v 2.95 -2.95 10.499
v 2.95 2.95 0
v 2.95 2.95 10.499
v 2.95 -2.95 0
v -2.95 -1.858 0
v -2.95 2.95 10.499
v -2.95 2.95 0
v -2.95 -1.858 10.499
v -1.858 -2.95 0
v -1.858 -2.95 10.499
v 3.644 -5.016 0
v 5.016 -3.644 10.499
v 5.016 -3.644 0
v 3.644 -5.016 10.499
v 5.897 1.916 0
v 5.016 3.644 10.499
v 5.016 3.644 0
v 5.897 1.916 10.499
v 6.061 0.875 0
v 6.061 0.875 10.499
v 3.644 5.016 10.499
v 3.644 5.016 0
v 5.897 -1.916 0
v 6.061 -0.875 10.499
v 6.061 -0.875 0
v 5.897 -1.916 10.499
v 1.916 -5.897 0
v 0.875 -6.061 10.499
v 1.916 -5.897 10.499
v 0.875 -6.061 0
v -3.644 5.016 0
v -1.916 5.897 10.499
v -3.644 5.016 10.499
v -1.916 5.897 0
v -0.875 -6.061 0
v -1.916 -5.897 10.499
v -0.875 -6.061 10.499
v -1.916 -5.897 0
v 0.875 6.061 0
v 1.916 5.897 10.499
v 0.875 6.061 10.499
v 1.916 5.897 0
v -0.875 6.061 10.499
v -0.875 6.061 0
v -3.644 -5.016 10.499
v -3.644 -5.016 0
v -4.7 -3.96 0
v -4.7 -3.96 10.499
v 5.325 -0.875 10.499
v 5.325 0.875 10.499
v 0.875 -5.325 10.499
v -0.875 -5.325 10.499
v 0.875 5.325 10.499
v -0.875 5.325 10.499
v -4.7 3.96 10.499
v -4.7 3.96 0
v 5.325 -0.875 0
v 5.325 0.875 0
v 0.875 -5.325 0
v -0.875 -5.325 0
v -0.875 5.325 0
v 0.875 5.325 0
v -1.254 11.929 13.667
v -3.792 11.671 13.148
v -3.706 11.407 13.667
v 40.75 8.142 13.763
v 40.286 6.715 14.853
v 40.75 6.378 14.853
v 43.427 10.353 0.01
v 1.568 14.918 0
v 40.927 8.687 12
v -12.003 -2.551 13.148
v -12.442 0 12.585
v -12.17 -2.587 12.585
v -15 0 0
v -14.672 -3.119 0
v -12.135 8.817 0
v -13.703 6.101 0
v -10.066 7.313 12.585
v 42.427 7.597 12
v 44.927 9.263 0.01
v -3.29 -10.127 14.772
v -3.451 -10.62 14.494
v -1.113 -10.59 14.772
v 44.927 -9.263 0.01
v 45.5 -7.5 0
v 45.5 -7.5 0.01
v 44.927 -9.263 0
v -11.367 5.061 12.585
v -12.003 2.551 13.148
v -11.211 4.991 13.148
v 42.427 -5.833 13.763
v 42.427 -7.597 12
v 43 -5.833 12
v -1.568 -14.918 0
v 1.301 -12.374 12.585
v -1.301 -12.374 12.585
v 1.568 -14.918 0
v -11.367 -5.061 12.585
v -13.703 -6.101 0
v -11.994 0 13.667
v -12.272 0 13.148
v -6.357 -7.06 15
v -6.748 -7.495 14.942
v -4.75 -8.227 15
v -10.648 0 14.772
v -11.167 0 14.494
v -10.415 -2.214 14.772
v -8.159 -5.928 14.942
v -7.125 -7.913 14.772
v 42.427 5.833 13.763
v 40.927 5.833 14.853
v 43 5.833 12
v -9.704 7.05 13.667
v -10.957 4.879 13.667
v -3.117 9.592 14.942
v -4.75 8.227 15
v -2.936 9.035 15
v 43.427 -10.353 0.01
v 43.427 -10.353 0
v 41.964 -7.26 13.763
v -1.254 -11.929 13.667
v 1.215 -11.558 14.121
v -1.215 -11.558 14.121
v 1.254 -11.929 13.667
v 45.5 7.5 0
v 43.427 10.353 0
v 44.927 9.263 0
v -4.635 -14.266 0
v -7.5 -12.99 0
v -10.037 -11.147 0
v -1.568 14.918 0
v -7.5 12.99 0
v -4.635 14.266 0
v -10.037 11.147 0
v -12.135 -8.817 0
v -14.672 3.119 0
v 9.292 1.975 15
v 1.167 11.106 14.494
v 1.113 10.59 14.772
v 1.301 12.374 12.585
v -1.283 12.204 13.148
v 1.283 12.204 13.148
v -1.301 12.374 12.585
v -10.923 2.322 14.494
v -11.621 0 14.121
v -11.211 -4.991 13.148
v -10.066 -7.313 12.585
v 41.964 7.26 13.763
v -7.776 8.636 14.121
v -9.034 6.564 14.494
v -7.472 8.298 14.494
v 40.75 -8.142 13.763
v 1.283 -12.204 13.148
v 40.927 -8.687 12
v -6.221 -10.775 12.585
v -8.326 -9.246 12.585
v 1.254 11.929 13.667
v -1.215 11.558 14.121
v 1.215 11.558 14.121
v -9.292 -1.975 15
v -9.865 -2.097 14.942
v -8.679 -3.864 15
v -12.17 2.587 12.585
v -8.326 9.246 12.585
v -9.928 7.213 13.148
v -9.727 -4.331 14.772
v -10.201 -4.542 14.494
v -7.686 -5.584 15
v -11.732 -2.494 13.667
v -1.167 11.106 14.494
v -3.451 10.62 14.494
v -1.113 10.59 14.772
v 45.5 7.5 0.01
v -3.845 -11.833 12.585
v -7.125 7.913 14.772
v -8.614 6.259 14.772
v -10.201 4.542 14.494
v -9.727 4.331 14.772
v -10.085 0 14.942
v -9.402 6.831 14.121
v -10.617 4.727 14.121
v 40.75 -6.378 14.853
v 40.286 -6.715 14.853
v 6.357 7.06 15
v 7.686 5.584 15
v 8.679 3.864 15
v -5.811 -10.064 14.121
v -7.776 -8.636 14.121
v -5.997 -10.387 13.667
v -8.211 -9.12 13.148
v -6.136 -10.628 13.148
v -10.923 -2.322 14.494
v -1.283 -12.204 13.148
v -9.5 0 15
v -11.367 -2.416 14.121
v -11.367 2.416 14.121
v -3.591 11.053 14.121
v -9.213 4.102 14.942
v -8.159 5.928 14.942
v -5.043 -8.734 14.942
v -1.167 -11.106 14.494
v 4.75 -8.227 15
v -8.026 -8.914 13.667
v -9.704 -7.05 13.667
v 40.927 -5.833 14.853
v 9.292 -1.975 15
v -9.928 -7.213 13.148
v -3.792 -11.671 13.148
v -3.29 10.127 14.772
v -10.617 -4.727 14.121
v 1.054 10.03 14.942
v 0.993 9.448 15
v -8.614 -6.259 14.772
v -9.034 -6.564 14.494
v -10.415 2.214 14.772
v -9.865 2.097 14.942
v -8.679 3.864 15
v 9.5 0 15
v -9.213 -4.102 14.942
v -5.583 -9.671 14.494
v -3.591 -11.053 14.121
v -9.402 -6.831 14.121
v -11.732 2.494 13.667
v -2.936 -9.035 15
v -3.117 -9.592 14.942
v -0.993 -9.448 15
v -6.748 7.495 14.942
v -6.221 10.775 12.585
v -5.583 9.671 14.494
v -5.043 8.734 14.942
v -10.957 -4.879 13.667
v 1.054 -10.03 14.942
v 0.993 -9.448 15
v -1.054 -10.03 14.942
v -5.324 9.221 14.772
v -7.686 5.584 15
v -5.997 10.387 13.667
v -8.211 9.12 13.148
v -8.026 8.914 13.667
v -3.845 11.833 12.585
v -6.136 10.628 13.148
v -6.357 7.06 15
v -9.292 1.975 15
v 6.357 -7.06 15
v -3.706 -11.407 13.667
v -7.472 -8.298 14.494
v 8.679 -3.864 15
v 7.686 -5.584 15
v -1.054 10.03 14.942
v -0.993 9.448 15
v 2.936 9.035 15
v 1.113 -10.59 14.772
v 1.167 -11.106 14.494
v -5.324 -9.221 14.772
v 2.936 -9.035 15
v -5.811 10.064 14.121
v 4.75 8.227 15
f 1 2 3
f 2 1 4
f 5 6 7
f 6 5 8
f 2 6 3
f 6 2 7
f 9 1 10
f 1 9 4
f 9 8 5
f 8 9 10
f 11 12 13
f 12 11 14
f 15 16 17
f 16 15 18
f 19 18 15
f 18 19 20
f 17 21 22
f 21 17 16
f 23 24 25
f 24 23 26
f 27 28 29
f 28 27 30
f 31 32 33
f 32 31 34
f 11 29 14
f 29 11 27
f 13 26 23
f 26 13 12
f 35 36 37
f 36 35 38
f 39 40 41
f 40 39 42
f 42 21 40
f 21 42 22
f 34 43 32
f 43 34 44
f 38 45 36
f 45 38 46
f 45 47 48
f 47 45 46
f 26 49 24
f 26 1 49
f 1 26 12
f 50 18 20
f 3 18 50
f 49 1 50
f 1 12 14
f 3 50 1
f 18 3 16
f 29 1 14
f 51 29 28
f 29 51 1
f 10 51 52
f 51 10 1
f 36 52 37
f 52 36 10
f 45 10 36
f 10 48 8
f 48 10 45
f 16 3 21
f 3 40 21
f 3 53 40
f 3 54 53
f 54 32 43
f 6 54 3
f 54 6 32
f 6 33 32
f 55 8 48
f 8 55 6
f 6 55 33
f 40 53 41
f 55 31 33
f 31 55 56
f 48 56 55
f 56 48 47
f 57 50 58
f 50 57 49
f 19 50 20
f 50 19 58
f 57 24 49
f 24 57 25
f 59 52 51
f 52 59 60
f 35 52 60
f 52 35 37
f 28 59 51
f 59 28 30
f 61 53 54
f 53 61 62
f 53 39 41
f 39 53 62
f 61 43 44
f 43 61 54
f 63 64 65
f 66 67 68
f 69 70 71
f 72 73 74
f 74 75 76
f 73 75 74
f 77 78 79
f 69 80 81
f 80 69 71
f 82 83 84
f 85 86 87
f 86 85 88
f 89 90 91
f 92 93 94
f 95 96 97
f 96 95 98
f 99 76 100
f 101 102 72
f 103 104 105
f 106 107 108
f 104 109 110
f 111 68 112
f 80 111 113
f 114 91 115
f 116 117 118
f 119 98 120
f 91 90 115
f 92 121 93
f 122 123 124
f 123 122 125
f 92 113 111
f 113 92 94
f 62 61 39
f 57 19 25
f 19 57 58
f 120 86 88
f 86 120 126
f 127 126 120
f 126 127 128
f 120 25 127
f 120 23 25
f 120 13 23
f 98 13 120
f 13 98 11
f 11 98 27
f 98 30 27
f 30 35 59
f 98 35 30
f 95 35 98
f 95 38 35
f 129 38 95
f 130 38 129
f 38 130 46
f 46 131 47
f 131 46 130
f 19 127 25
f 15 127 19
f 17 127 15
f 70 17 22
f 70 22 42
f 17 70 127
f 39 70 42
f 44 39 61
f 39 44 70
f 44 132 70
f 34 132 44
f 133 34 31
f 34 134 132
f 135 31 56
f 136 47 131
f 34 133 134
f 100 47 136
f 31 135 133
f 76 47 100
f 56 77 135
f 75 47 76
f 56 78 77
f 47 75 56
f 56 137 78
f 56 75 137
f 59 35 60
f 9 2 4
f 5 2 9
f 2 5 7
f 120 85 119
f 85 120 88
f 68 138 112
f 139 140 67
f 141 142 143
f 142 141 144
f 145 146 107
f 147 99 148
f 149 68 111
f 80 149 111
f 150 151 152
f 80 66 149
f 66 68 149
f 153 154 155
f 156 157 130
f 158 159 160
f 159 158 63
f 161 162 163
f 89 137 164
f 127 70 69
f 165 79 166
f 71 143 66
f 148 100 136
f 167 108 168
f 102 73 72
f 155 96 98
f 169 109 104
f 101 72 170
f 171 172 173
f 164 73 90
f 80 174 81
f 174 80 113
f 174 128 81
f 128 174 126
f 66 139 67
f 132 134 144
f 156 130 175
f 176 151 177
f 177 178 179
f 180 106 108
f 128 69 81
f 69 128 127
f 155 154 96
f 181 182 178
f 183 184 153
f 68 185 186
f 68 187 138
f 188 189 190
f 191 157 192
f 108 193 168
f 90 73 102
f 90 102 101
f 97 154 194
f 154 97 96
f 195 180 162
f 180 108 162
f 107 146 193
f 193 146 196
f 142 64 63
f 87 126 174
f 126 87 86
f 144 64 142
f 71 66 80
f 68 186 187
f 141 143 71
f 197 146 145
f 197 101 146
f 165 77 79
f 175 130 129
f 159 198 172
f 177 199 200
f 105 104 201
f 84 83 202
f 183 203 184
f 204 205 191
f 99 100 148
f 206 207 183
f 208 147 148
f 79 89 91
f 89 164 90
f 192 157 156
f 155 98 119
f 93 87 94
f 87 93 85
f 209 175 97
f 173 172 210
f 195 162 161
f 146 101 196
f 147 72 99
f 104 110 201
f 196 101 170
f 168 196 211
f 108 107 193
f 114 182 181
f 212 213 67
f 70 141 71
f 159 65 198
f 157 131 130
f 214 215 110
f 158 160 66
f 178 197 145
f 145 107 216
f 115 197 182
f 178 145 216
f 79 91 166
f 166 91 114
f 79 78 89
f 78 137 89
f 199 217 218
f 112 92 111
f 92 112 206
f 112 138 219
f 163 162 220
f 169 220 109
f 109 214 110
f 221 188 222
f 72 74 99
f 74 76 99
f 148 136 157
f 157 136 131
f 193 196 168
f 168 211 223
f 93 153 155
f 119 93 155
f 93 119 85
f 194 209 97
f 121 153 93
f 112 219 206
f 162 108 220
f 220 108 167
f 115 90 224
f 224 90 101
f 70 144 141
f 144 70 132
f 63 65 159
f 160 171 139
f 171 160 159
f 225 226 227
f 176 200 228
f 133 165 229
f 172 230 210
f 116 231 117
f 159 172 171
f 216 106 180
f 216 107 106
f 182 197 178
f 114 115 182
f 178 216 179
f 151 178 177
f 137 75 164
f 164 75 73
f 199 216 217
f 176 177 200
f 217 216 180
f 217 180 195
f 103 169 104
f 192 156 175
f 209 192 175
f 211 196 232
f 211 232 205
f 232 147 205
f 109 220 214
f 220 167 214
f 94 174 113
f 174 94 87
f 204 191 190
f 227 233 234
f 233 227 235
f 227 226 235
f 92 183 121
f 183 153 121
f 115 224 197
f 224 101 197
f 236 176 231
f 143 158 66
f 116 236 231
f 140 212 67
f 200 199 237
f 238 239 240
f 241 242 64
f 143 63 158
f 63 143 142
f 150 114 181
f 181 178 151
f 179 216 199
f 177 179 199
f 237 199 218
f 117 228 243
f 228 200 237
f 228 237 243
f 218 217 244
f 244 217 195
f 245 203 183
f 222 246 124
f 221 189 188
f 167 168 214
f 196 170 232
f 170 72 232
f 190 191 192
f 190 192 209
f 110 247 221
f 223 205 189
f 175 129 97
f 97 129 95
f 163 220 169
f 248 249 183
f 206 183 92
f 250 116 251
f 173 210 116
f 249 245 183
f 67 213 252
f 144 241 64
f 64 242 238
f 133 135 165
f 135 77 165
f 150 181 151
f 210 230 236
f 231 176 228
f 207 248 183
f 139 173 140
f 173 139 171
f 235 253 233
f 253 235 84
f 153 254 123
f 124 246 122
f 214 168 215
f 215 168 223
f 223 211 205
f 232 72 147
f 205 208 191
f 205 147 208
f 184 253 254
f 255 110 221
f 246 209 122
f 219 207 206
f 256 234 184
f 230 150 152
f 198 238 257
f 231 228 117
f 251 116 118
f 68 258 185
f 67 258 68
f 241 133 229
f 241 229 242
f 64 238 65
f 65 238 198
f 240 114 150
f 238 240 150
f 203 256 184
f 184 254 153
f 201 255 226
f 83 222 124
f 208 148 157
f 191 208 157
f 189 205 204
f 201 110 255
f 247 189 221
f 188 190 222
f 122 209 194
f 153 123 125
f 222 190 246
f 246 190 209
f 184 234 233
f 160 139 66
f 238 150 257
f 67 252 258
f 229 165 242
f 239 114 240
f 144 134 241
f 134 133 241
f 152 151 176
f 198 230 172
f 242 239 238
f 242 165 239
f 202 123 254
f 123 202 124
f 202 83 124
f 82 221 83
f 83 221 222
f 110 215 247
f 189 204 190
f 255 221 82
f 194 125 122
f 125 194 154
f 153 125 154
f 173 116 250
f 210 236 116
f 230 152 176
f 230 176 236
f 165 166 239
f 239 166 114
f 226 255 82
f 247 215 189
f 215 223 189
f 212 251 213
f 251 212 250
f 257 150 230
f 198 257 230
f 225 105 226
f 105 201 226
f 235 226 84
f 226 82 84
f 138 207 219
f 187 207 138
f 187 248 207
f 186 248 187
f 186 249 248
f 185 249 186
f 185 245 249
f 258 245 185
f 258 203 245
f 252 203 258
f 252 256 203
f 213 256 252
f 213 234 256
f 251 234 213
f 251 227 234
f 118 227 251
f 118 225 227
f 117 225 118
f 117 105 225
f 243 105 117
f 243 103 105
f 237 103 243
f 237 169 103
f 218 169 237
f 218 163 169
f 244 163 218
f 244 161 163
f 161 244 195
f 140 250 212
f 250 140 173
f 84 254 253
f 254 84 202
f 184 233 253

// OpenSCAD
_t=false;

h=_t?11:15;
d1=_t?15:30;
d2=_t?15:25;
rg=_t?1:3;
h_hole=10.5;
xlen=_t?10:40;

ds1=0; // 3; // screw hole 1
ds2=5; // screw hole inset diameter

d_m=12.4;
d_c=5.9;
d_d=5;
d_h=8;

sx=1.75;
sxe=6.2;
d_corner=3.4;
d_edge=4.7;

_d=0.01;

module griff() {
difference() {
    hull() {
        cylinder(d1=d1,h=0.1);
        translate([0,0,h-rg]) rotate_extrude() translate([d2/2-rg,0]) circle(r=rg, $fn=32);
        //translate([30,0,h/2]) cube([h,h,h], center=true);
        if(!_t) {
        translate([xlen,h/2-(d1-d2)/3,h-rg]) sphere(r=rg);
        translate([xlen,-h/2+(d1-d2)/3,h-rg]) sphere(r=rg);
        translate([xlen+(d1-d2)/2,h/2,0]) linear_extrude(0.01) circle(r=rg);
        translate([xlen+(d1-d2)/2,-h/2,0]) linear_extrude(0.01) circle(r=rg);
        }
    }
    translate([0,0,-0.001]) hole();
}
}
griff();
if(_t)
translate([0,20,0]) intersection() {
    griff();
    cube([d_c+0.5,d_c+0.5,22], center=true);
}

module hole() {
        module edge() {
            // cylinder(h=22,d=2,center=true,$fn=16); 
            cube([sx,sx,22], center=true);
        }
    difference() {
        cylinder(h=h_hole,d=d_m);
        difference() {
            cube([d_c,d_c,22], center=true);
            rotate(45) translate([-5-d_corner,0,0]) cube([10,10,22], center=true);
        }
        translate([-10-d_edge,0,0]) cube([20,20,30],center=true);
        translate([sxe,0,0]) edge();
        translate([0,-sxe,0]) rotate(90) edge();
        translate([0,sxe,0]) rotate(-90) edge();
    }
    
    if(ds1) {
    translate([0,0,d_h/2]) rotate([0,-90,0]) cylinder(h=d1/2,d=ds1,$fn=5);
    translate([d1/2-d2,0,d_h/2]) rotate([0,-90,0]) cylinder(h=d1/2,d=ds2);
    }
    
}
